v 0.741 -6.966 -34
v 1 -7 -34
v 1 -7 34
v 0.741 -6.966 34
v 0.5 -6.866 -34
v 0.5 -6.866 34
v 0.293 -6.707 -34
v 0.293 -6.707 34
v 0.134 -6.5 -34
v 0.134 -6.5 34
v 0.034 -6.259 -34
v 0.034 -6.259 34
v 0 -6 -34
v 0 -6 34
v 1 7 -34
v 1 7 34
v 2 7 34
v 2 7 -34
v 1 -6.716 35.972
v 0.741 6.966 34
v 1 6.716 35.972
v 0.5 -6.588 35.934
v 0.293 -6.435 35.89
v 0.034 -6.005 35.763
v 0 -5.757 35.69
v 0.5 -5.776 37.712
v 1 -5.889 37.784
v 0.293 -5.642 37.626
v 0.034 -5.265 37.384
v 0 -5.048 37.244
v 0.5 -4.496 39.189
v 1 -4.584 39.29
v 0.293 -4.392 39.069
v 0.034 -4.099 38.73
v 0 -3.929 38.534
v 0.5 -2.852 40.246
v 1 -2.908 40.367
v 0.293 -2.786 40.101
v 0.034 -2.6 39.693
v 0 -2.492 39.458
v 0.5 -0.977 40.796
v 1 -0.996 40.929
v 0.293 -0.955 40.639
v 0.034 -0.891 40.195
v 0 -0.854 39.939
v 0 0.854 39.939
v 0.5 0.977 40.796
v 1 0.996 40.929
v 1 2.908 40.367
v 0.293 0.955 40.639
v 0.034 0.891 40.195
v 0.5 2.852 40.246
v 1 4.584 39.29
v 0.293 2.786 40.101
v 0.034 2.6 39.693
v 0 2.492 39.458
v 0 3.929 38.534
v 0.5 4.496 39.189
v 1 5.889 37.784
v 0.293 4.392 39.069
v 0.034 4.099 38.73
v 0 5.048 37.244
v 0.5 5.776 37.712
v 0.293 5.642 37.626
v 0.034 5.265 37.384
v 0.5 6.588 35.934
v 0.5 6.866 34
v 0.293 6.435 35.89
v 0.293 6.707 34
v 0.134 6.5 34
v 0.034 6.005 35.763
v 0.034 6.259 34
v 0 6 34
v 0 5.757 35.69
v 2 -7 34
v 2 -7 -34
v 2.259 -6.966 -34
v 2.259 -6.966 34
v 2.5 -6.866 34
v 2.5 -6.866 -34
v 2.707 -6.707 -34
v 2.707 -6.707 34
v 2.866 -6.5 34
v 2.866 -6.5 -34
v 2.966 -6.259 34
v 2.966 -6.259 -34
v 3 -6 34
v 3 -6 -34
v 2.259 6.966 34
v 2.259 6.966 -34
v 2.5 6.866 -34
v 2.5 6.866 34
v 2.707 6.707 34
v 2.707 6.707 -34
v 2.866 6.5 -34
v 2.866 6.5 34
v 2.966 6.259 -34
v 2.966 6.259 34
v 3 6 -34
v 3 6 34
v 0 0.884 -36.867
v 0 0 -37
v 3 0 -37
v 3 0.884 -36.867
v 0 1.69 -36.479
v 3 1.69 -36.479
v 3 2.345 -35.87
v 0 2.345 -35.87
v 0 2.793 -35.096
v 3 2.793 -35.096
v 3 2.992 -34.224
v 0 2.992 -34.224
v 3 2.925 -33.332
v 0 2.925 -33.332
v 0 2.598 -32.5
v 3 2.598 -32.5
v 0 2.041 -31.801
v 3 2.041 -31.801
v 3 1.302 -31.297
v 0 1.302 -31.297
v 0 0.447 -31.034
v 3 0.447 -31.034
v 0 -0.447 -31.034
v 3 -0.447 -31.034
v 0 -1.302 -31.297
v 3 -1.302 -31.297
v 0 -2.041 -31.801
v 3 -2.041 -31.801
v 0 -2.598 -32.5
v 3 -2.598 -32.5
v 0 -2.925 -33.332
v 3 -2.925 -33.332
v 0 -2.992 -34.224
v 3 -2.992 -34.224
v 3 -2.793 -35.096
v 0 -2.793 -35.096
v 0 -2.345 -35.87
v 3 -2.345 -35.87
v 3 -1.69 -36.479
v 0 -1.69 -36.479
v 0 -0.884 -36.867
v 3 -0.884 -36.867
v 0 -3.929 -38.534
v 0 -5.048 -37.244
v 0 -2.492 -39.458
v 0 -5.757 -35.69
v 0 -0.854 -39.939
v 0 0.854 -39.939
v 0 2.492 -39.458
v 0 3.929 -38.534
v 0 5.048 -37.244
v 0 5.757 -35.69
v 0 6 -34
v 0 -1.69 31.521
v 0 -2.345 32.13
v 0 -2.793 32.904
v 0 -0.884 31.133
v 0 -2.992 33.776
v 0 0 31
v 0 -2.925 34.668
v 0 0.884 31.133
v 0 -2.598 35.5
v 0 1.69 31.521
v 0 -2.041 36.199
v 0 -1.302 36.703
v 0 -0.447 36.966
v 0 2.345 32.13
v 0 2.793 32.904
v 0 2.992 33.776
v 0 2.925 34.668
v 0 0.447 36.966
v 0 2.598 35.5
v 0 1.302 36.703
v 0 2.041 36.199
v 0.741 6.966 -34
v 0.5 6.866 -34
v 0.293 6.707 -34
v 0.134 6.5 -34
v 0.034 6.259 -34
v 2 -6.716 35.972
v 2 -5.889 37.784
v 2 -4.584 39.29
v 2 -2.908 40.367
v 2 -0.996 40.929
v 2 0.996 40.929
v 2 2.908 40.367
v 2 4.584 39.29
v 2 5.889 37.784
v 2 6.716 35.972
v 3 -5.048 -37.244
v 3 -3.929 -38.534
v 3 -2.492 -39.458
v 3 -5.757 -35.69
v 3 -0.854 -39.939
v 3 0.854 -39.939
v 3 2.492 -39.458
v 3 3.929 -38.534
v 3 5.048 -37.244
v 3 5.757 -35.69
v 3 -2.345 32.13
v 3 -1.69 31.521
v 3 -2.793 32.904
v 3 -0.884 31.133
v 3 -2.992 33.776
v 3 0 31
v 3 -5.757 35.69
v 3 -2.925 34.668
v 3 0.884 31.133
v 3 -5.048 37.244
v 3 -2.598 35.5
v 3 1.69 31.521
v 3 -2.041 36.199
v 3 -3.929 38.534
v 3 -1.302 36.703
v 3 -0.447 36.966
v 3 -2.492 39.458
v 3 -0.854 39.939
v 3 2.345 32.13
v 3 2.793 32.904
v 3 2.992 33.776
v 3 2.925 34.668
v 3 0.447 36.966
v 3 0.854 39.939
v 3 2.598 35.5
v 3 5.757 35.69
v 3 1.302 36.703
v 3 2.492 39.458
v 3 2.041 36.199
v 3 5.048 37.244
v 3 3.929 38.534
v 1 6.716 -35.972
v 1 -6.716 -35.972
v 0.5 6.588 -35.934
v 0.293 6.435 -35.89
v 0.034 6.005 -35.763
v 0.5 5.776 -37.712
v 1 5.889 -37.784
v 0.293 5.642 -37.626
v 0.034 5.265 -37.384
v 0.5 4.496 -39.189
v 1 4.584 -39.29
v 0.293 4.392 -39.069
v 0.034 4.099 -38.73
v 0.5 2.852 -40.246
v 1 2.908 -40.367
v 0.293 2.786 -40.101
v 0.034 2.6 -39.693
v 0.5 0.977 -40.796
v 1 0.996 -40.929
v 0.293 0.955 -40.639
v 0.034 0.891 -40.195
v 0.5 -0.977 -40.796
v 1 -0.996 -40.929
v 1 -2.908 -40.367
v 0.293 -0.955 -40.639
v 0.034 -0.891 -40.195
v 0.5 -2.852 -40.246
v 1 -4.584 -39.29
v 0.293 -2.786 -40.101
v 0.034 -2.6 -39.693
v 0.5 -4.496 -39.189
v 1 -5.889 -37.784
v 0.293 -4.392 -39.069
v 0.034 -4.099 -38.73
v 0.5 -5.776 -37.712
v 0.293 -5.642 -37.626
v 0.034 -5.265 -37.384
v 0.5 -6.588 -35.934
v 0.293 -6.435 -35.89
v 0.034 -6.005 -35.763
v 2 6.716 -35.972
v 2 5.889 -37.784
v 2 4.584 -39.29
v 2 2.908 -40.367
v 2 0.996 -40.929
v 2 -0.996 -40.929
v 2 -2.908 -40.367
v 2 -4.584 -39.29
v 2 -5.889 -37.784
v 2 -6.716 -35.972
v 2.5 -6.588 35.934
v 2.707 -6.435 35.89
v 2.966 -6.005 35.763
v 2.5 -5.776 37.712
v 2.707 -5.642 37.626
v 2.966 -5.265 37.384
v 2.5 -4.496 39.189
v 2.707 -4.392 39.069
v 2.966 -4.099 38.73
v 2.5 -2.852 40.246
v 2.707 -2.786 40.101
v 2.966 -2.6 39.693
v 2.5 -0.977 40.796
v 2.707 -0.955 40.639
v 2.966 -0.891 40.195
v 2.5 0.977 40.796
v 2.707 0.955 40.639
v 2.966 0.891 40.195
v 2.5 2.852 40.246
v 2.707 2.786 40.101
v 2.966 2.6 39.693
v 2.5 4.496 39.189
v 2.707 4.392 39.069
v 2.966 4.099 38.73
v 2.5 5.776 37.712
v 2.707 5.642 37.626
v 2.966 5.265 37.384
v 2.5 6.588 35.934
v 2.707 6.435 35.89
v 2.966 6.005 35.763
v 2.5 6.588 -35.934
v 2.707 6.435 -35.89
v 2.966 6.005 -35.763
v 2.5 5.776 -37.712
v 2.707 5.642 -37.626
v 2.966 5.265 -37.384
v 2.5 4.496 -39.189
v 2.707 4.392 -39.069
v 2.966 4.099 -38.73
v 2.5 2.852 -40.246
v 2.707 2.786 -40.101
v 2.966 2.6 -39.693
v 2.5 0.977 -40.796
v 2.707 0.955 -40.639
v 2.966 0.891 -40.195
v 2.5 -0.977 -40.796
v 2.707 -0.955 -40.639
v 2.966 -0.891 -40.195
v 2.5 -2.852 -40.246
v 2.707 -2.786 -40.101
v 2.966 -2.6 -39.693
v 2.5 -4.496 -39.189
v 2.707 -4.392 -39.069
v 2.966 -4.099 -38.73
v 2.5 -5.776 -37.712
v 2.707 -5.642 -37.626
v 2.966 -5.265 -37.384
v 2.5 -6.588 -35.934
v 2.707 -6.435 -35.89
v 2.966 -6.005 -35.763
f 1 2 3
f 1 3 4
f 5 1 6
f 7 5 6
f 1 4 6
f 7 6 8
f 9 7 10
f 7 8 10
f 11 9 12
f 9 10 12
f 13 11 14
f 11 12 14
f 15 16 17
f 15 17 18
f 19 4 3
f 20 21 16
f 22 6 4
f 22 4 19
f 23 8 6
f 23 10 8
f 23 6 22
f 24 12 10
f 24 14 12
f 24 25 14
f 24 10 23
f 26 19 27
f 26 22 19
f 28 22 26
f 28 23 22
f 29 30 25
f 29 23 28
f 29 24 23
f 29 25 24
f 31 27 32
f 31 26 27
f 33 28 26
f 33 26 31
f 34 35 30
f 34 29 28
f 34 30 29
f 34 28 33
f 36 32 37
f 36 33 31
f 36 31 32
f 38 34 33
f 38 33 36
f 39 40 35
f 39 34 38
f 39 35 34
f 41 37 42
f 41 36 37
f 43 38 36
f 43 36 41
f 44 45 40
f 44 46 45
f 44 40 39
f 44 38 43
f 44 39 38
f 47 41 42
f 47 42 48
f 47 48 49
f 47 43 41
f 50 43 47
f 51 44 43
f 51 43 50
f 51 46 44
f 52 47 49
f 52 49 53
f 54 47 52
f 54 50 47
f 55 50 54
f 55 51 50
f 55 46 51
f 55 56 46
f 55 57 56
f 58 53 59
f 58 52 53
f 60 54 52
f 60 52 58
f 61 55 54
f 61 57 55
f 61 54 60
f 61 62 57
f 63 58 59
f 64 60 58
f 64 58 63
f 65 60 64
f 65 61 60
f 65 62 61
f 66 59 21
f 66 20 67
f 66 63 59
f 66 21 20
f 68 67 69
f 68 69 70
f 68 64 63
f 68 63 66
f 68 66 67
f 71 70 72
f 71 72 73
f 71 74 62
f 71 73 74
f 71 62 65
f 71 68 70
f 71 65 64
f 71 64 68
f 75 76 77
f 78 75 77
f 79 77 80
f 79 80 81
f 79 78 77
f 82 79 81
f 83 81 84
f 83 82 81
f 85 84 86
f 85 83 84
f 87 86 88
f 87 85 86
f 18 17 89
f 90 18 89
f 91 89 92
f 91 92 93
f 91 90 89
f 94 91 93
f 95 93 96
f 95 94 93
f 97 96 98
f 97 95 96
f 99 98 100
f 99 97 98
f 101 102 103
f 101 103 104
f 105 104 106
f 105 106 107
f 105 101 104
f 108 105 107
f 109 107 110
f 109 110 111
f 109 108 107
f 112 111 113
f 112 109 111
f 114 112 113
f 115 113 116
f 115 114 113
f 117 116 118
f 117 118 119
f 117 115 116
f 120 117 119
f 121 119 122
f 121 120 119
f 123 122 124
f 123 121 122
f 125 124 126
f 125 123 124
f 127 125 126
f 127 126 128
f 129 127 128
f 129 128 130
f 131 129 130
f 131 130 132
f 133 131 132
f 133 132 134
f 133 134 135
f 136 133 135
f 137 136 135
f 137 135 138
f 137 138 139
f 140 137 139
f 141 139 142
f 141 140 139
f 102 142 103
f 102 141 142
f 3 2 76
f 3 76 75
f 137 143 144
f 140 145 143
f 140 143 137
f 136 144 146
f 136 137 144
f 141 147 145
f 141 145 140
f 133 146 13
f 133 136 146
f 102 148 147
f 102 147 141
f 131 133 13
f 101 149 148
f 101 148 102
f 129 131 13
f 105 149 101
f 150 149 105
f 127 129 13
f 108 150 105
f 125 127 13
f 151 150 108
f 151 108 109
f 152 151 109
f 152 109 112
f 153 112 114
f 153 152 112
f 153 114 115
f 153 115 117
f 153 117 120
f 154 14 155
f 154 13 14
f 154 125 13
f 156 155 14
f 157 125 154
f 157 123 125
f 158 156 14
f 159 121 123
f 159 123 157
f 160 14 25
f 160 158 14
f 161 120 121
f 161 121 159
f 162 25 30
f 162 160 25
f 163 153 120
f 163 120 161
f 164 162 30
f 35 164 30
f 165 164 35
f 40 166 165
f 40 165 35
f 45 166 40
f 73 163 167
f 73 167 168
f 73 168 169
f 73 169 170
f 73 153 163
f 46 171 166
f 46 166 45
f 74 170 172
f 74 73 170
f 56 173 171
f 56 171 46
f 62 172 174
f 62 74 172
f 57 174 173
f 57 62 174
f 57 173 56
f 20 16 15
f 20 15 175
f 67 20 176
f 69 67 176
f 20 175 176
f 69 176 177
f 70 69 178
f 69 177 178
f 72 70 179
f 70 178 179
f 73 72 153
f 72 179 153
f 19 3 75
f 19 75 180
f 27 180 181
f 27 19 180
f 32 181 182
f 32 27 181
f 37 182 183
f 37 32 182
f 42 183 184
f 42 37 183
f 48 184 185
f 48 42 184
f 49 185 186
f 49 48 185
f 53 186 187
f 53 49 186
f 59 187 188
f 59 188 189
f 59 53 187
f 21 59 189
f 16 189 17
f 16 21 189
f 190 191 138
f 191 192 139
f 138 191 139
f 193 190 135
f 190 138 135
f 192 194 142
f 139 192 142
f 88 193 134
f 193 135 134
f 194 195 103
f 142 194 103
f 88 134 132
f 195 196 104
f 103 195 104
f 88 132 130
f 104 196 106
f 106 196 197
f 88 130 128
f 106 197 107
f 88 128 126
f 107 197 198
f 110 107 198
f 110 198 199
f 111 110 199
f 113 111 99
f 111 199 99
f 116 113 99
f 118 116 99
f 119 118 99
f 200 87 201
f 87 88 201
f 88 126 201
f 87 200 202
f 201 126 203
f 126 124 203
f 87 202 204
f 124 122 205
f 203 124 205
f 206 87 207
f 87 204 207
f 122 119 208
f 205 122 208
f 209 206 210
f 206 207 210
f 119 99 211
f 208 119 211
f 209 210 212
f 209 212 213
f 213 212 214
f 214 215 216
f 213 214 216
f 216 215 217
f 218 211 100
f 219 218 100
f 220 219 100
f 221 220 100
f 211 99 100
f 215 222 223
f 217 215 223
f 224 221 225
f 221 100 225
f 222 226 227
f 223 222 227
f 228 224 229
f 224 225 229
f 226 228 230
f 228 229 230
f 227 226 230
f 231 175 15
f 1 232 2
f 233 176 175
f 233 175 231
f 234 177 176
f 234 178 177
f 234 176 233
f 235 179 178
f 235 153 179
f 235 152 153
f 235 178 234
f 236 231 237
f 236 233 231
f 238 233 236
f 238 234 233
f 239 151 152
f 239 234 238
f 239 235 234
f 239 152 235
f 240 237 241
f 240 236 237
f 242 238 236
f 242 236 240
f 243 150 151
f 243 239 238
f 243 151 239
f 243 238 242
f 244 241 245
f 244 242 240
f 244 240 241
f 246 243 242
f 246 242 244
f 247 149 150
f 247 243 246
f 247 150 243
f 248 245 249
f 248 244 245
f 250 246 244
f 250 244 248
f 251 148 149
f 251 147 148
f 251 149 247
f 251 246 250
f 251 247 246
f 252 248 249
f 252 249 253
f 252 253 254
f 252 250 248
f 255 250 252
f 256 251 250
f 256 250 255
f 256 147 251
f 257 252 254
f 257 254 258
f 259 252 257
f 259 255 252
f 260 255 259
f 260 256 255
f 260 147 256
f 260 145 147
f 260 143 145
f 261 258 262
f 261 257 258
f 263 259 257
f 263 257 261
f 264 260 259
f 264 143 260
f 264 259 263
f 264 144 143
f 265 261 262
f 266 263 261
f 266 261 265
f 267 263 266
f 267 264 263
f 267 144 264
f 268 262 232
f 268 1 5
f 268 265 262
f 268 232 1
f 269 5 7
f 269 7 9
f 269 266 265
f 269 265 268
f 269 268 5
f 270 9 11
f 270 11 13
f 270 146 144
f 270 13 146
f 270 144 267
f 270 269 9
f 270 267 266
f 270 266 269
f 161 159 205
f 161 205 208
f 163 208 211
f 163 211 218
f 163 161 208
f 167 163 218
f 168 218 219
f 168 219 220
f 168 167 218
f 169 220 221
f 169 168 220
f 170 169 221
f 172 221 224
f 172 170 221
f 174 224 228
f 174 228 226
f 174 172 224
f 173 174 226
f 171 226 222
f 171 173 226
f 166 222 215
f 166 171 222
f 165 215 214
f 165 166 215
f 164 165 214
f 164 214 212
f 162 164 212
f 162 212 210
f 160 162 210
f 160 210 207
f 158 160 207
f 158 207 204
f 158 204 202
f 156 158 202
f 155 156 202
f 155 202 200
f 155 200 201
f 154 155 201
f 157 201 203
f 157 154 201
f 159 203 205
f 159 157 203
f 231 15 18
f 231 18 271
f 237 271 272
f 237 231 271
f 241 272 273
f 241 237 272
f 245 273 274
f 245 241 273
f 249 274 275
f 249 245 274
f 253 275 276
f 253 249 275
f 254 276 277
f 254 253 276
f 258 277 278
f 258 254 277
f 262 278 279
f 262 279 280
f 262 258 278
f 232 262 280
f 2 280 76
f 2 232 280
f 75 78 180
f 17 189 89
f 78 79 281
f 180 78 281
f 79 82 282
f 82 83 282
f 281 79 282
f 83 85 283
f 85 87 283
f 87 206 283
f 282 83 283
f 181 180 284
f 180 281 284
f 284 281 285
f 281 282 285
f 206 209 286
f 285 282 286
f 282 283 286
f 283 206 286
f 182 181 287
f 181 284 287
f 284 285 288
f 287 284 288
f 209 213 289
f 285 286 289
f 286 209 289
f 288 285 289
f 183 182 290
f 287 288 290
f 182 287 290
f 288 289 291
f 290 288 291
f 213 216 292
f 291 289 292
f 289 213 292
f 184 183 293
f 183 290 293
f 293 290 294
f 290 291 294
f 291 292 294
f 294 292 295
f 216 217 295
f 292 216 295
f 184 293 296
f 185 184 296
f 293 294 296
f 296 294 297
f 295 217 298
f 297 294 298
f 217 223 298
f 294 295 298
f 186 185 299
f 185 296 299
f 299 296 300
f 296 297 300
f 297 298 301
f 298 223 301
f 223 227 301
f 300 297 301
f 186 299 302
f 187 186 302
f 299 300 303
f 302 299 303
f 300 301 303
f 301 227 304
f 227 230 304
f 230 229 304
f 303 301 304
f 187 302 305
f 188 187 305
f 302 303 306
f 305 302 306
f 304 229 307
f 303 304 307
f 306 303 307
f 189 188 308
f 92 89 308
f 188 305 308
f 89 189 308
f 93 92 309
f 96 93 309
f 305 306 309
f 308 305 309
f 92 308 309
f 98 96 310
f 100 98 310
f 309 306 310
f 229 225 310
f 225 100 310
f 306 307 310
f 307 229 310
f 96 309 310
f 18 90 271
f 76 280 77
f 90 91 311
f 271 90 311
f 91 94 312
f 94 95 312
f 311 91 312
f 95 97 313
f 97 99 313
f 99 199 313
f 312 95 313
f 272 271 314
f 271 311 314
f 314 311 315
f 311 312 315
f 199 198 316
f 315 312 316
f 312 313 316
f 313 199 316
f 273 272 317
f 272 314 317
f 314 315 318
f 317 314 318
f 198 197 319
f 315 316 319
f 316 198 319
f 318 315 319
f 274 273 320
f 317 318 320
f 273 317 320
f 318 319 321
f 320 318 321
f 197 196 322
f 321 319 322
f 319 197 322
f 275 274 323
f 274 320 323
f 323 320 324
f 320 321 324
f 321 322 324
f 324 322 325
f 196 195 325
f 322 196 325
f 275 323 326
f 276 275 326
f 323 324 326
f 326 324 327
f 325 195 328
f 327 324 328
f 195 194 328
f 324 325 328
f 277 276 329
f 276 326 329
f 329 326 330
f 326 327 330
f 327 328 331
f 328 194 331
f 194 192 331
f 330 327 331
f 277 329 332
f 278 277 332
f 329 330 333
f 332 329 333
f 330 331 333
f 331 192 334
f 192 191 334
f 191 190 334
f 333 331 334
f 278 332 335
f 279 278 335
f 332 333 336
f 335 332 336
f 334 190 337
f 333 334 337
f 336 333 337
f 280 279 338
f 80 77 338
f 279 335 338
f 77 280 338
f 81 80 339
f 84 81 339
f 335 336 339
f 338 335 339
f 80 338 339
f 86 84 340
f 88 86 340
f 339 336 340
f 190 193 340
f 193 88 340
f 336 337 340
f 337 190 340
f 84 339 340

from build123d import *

# Parameters (mm, degrees)
SKETCH_1_R      = 3
EXTRUDE_1_DEPTH = 3
FILLET_1_R      = 1


with BuildPart() as part:
    # 草图1 → 凸台-拉伸1 (new body)
    with BuildSketch(Plane(origin=(0, 0, 0), x_dir=(0, 0, -1), z_dir=(1, 0, 0))):
        with BuildLine():
            Line((-34, 7), (34, 7))
            ThreePointArc((34, 7), (41, 0), (34, -7))
            Line((34, -7), (-34, -7))
            ThreePointArc((-34, -7), (-41, 0), (-34, 7))
        make_face()
        with Locations((-34, 0)):
            Circle(SKETCH_1_R, mode=Mode.SUBTRACT)
        with Locations((34, 0)):
            Circle(SKETCH_1_R, mode=Mode.SUBTRACT)
    extrude(amount=EXTRUDE_1_DEPTH)

    # 圆角1
    fillet_1_edges = [part.edges().sort_by_distance(p)[0] for p in [
        (3, 0, -41),
        (3, 7, 0),
        (3, 0, 41),
        (0, 7, 0),
        (0, 0, -41),
        (0, -7, 0),
        (0, 0, 41),
        (3, -7, 0),
    ]]
    fillet(fillet_1_edges, radius=FILLET_1_R)


solid = part.part
